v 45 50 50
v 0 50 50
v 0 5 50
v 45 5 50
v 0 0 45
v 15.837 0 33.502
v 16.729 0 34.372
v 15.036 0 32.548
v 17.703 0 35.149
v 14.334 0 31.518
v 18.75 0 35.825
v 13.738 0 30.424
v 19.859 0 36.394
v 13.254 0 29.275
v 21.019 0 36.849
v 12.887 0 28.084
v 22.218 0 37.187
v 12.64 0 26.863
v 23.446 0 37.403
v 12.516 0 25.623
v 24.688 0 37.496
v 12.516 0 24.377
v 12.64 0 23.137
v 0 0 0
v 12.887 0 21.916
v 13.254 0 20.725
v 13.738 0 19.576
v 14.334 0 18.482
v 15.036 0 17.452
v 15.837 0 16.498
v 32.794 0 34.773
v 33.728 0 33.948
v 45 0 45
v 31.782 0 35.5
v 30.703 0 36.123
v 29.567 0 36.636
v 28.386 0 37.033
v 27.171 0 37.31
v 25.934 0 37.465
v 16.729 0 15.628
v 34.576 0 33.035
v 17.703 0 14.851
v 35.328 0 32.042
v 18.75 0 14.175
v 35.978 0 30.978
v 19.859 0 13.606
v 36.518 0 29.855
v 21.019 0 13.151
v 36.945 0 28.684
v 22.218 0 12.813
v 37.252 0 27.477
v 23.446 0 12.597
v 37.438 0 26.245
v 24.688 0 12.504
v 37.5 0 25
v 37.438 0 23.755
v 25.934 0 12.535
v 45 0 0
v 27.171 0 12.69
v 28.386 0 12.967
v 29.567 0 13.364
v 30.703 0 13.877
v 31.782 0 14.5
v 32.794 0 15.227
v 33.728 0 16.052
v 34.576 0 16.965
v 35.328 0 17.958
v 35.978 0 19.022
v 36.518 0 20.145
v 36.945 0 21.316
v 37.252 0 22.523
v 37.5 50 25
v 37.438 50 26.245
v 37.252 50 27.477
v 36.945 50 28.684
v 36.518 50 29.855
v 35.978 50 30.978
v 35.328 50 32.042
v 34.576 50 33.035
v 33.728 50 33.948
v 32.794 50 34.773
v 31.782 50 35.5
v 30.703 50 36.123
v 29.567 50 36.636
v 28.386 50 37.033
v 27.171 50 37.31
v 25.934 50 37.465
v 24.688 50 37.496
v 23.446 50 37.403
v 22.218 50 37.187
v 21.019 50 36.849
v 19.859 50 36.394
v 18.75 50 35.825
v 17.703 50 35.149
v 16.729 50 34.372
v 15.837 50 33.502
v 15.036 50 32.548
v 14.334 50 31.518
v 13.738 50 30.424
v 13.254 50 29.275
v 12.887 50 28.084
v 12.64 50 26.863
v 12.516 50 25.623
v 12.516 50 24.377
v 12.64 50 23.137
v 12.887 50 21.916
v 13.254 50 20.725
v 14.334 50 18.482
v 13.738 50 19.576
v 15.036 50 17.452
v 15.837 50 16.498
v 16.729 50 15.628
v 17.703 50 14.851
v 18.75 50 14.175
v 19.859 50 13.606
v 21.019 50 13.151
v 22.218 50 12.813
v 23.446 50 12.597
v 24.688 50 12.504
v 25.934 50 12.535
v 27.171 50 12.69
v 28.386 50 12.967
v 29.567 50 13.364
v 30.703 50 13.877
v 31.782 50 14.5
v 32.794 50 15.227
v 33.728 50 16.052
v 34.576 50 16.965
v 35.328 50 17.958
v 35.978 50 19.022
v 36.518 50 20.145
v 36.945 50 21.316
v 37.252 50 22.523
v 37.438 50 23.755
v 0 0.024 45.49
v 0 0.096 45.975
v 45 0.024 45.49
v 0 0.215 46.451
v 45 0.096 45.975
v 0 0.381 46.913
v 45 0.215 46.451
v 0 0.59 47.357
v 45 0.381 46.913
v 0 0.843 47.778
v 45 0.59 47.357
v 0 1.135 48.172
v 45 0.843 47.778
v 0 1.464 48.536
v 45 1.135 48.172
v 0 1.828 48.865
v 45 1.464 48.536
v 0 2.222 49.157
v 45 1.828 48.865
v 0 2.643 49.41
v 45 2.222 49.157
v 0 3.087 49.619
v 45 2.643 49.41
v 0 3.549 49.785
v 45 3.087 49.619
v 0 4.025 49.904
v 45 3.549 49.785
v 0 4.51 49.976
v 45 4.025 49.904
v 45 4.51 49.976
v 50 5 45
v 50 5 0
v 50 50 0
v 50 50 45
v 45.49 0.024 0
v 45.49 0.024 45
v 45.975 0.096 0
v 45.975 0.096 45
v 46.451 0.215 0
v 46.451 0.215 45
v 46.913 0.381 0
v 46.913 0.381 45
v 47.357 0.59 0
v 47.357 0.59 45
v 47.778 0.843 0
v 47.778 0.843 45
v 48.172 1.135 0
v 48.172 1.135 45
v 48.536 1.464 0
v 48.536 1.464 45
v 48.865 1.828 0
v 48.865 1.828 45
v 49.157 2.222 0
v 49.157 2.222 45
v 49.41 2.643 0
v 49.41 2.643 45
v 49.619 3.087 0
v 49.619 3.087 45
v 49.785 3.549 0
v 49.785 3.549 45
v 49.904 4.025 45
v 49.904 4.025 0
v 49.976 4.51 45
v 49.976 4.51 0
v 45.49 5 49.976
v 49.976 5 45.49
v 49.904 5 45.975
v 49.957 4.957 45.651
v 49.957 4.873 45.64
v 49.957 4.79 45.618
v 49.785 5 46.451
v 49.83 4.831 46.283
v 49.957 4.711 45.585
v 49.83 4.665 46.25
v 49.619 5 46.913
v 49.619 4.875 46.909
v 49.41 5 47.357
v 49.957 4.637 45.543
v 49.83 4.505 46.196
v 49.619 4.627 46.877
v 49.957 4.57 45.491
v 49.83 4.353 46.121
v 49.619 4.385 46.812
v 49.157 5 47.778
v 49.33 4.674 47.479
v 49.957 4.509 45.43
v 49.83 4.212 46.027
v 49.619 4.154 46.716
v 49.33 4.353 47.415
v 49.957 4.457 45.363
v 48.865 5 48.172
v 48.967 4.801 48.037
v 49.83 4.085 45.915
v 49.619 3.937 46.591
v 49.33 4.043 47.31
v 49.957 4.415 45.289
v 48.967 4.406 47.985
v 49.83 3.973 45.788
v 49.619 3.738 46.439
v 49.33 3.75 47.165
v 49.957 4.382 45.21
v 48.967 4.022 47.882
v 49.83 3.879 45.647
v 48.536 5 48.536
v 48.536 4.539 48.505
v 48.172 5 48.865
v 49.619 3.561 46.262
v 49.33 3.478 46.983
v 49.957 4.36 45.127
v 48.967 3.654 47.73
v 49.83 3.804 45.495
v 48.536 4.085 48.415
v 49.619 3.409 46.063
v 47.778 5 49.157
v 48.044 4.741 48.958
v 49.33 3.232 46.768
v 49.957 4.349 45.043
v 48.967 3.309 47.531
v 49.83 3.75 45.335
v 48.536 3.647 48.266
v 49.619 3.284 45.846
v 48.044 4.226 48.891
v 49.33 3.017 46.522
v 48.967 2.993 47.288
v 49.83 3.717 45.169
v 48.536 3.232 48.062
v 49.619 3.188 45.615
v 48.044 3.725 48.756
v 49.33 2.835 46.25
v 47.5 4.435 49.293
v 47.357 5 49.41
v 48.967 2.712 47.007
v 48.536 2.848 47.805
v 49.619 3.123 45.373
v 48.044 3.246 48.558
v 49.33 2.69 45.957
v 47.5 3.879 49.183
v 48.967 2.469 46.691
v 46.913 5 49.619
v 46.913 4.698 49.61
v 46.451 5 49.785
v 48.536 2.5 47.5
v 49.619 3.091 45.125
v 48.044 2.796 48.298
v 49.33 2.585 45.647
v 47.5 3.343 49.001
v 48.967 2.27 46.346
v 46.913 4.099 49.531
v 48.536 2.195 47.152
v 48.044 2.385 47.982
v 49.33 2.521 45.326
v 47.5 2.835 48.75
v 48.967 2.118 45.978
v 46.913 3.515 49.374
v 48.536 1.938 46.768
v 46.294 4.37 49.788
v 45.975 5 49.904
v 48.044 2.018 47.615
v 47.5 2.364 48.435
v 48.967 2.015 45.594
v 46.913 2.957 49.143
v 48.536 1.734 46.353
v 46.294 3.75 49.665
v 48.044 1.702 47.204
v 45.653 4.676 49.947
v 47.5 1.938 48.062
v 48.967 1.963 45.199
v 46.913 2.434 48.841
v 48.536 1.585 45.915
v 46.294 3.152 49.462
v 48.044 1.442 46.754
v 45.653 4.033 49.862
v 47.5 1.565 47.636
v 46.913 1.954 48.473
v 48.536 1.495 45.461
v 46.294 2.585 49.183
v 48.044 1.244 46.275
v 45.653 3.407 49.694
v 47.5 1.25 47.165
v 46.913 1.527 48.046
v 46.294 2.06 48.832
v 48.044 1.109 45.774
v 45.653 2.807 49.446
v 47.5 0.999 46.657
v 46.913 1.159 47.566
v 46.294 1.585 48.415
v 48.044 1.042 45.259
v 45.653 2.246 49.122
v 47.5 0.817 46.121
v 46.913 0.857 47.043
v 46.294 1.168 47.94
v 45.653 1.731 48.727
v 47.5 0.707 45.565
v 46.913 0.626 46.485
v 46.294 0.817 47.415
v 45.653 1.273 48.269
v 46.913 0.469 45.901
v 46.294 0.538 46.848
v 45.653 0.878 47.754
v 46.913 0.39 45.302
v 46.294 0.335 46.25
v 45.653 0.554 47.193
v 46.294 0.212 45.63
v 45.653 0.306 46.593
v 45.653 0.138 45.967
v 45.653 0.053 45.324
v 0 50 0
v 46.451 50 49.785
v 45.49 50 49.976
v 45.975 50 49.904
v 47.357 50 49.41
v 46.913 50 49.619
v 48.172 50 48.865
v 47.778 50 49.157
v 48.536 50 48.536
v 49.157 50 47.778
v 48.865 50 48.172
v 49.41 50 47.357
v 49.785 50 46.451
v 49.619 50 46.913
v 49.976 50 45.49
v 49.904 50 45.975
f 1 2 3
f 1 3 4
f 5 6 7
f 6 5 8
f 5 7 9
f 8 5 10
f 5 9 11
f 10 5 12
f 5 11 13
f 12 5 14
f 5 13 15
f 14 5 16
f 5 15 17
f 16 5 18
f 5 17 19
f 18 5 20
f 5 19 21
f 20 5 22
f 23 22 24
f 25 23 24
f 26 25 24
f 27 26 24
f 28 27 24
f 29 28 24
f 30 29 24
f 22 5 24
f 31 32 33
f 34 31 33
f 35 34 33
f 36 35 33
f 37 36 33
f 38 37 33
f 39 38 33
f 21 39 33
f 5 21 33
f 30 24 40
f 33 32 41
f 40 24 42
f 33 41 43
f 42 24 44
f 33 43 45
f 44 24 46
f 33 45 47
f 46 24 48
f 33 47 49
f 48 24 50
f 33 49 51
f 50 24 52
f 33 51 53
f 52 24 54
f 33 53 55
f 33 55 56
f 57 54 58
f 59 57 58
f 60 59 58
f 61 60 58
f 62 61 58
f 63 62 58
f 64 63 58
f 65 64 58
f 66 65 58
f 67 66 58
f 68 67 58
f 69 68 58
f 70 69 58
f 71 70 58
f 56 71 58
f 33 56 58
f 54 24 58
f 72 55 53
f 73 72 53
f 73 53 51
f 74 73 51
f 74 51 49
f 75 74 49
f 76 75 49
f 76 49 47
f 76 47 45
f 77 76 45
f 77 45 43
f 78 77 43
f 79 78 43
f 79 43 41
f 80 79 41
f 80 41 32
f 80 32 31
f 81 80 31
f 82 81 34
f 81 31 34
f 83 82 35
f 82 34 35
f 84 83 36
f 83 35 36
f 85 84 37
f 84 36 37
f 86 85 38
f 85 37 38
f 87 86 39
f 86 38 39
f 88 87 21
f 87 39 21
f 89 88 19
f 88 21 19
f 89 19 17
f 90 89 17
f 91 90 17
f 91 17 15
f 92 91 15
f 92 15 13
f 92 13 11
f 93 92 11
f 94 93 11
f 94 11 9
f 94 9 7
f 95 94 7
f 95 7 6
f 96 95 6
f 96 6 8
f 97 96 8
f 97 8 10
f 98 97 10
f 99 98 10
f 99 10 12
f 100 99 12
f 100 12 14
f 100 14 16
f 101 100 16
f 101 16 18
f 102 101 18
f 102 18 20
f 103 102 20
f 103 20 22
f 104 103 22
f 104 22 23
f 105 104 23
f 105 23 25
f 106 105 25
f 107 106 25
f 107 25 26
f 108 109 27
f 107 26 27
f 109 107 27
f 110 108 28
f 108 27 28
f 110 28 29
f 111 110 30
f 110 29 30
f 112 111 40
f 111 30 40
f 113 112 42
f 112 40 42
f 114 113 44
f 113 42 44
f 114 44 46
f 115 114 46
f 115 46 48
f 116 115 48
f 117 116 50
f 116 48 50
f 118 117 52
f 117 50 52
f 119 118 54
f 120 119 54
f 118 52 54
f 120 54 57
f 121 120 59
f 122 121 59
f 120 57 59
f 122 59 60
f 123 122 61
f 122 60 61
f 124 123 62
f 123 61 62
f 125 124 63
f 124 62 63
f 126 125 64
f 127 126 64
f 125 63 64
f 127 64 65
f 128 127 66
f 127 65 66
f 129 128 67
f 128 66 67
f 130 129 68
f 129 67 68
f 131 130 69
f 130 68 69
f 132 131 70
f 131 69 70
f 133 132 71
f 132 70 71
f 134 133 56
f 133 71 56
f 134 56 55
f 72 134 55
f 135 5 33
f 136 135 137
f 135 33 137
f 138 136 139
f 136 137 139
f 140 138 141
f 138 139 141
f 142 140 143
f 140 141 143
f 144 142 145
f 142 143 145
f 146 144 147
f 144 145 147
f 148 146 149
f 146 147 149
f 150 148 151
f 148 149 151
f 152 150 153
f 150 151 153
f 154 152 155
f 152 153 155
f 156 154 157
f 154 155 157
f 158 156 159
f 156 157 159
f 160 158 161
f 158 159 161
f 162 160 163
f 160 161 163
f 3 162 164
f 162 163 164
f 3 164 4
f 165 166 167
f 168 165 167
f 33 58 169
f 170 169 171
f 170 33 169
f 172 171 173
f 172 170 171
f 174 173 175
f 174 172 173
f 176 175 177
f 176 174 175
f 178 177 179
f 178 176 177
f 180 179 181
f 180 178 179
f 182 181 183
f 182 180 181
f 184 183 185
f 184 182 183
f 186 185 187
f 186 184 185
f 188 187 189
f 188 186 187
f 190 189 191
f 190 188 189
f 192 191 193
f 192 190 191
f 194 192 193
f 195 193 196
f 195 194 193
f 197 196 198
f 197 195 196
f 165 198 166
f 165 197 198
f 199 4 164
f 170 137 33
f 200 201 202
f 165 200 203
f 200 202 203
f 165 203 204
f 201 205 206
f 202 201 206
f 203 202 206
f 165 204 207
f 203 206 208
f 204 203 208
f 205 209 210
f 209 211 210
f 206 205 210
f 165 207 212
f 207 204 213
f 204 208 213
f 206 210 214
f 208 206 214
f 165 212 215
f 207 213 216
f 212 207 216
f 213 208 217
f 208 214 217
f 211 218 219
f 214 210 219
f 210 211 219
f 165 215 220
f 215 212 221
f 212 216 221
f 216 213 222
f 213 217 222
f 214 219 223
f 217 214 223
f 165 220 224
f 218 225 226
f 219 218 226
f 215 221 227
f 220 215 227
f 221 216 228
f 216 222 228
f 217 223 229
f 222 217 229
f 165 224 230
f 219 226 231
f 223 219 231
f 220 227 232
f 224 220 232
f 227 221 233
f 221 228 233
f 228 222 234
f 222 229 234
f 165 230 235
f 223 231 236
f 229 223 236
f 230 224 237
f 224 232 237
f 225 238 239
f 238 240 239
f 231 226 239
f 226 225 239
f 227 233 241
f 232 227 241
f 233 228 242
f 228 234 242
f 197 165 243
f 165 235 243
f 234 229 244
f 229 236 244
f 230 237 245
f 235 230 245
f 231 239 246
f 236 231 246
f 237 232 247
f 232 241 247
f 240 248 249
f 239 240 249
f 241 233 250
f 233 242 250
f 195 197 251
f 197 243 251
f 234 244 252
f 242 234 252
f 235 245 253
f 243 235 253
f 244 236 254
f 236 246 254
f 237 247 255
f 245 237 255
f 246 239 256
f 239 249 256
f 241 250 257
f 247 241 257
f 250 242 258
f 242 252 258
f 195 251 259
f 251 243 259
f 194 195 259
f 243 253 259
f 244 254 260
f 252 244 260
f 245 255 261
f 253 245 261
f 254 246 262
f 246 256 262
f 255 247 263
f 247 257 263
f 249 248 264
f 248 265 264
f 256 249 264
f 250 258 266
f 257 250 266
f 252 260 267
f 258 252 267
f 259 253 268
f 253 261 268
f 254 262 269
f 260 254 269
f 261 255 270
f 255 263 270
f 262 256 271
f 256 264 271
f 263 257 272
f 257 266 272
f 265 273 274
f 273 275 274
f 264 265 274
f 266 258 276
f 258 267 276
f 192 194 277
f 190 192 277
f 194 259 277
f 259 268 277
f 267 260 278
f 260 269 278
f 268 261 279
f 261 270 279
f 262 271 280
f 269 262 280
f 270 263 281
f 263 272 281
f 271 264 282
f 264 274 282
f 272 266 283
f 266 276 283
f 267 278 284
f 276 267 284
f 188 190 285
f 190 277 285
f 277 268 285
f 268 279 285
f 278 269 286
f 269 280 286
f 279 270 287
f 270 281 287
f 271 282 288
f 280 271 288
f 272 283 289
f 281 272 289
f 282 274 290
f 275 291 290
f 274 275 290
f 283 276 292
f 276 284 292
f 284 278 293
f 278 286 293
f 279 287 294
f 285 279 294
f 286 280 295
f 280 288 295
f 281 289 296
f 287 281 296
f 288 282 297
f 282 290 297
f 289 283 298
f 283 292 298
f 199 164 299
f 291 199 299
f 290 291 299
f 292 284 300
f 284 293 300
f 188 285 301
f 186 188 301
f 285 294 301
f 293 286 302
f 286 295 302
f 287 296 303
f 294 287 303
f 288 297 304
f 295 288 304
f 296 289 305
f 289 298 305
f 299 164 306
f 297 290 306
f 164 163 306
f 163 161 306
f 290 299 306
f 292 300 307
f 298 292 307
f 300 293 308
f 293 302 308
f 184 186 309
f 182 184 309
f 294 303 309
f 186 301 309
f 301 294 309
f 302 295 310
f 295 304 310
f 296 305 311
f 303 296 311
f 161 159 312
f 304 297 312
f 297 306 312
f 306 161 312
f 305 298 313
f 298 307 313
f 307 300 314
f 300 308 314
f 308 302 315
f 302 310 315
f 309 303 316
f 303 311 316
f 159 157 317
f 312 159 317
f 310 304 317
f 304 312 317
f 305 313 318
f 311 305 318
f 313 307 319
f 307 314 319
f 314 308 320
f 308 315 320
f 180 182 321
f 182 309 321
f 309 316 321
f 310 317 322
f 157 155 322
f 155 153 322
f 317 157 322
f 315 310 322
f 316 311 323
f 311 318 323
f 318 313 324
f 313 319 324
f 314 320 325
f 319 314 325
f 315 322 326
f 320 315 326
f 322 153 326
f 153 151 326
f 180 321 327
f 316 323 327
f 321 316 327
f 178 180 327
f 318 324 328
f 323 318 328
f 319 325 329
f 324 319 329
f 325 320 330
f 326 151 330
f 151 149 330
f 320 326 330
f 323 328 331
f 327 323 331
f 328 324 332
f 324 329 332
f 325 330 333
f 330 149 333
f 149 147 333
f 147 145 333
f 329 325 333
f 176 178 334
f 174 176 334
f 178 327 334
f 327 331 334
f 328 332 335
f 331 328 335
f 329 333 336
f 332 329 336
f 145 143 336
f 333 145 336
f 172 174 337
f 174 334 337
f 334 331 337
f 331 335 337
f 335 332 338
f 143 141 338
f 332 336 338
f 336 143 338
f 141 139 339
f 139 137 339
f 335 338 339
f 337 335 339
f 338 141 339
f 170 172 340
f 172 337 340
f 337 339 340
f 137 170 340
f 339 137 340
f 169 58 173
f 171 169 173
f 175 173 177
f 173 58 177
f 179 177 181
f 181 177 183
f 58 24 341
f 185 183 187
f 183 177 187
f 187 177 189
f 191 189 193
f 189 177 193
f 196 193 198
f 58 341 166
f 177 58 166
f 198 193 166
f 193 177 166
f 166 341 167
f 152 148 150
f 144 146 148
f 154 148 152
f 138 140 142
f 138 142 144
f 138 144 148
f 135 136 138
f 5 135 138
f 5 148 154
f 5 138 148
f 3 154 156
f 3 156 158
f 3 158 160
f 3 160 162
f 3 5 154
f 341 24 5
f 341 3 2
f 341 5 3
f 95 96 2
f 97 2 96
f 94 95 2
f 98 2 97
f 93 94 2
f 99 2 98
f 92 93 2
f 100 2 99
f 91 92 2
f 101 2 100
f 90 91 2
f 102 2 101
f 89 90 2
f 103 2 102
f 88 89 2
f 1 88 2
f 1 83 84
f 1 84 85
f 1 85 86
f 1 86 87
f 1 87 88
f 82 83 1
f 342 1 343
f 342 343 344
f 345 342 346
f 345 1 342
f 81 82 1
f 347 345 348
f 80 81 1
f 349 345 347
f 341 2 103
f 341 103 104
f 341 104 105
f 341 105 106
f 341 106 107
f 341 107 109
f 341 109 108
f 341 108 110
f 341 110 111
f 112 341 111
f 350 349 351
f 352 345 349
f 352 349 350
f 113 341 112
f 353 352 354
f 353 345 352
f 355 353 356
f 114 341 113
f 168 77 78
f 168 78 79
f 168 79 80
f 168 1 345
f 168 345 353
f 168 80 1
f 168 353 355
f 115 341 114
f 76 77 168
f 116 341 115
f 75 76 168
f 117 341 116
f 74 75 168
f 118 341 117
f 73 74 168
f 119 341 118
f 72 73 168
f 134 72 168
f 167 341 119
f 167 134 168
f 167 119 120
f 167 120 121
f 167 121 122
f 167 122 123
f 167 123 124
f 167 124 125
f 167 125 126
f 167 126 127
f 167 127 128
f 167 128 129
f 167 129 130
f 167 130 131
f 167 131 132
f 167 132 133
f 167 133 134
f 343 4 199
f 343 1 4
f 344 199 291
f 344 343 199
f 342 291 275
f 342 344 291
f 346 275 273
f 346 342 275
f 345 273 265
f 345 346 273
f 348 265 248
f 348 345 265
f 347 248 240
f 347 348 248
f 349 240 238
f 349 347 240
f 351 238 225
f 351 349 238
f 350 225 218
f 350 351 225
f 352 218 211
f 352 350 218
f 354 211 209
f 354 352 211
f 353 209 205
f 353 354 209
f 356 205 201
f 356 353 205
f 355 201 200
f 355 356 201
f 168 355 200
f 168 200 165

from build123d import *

# Parameters (mm, degrees)
F0_W     = 50
F0_H     = 50
F1_DEPTH = 50
F2_R     = 12.5
F3_DEPTH = 50.001
F4_R     = 5


with BuildPart() as f1:
    # F0 (on Top) → F1 (new body)
    with BuildSketch(Plane.XY):
        with Locations((25, 25)):
            Rectangle(F0_W, F0_H)
    extrude(amount=F1_DEPTH)

    # F2 (on face) → F3 (cut, through all)
    with BuildSketch(Plane.XZ):
        with Locations((25, 25)):
            Circle(F2_R)
    extrude(amount=-F3_DEPTH, mode=Mode.SUBTRACT)

    # F4
    f4_edges = [f1.edges().sort_by_distance(p)[0] for p in [
        (25, 0, 50),
        (50, 25, 50),
        (50, 0, 25),
    ]]
    fillet(f4_edges, radius=F4_R)


solid = f1.part
